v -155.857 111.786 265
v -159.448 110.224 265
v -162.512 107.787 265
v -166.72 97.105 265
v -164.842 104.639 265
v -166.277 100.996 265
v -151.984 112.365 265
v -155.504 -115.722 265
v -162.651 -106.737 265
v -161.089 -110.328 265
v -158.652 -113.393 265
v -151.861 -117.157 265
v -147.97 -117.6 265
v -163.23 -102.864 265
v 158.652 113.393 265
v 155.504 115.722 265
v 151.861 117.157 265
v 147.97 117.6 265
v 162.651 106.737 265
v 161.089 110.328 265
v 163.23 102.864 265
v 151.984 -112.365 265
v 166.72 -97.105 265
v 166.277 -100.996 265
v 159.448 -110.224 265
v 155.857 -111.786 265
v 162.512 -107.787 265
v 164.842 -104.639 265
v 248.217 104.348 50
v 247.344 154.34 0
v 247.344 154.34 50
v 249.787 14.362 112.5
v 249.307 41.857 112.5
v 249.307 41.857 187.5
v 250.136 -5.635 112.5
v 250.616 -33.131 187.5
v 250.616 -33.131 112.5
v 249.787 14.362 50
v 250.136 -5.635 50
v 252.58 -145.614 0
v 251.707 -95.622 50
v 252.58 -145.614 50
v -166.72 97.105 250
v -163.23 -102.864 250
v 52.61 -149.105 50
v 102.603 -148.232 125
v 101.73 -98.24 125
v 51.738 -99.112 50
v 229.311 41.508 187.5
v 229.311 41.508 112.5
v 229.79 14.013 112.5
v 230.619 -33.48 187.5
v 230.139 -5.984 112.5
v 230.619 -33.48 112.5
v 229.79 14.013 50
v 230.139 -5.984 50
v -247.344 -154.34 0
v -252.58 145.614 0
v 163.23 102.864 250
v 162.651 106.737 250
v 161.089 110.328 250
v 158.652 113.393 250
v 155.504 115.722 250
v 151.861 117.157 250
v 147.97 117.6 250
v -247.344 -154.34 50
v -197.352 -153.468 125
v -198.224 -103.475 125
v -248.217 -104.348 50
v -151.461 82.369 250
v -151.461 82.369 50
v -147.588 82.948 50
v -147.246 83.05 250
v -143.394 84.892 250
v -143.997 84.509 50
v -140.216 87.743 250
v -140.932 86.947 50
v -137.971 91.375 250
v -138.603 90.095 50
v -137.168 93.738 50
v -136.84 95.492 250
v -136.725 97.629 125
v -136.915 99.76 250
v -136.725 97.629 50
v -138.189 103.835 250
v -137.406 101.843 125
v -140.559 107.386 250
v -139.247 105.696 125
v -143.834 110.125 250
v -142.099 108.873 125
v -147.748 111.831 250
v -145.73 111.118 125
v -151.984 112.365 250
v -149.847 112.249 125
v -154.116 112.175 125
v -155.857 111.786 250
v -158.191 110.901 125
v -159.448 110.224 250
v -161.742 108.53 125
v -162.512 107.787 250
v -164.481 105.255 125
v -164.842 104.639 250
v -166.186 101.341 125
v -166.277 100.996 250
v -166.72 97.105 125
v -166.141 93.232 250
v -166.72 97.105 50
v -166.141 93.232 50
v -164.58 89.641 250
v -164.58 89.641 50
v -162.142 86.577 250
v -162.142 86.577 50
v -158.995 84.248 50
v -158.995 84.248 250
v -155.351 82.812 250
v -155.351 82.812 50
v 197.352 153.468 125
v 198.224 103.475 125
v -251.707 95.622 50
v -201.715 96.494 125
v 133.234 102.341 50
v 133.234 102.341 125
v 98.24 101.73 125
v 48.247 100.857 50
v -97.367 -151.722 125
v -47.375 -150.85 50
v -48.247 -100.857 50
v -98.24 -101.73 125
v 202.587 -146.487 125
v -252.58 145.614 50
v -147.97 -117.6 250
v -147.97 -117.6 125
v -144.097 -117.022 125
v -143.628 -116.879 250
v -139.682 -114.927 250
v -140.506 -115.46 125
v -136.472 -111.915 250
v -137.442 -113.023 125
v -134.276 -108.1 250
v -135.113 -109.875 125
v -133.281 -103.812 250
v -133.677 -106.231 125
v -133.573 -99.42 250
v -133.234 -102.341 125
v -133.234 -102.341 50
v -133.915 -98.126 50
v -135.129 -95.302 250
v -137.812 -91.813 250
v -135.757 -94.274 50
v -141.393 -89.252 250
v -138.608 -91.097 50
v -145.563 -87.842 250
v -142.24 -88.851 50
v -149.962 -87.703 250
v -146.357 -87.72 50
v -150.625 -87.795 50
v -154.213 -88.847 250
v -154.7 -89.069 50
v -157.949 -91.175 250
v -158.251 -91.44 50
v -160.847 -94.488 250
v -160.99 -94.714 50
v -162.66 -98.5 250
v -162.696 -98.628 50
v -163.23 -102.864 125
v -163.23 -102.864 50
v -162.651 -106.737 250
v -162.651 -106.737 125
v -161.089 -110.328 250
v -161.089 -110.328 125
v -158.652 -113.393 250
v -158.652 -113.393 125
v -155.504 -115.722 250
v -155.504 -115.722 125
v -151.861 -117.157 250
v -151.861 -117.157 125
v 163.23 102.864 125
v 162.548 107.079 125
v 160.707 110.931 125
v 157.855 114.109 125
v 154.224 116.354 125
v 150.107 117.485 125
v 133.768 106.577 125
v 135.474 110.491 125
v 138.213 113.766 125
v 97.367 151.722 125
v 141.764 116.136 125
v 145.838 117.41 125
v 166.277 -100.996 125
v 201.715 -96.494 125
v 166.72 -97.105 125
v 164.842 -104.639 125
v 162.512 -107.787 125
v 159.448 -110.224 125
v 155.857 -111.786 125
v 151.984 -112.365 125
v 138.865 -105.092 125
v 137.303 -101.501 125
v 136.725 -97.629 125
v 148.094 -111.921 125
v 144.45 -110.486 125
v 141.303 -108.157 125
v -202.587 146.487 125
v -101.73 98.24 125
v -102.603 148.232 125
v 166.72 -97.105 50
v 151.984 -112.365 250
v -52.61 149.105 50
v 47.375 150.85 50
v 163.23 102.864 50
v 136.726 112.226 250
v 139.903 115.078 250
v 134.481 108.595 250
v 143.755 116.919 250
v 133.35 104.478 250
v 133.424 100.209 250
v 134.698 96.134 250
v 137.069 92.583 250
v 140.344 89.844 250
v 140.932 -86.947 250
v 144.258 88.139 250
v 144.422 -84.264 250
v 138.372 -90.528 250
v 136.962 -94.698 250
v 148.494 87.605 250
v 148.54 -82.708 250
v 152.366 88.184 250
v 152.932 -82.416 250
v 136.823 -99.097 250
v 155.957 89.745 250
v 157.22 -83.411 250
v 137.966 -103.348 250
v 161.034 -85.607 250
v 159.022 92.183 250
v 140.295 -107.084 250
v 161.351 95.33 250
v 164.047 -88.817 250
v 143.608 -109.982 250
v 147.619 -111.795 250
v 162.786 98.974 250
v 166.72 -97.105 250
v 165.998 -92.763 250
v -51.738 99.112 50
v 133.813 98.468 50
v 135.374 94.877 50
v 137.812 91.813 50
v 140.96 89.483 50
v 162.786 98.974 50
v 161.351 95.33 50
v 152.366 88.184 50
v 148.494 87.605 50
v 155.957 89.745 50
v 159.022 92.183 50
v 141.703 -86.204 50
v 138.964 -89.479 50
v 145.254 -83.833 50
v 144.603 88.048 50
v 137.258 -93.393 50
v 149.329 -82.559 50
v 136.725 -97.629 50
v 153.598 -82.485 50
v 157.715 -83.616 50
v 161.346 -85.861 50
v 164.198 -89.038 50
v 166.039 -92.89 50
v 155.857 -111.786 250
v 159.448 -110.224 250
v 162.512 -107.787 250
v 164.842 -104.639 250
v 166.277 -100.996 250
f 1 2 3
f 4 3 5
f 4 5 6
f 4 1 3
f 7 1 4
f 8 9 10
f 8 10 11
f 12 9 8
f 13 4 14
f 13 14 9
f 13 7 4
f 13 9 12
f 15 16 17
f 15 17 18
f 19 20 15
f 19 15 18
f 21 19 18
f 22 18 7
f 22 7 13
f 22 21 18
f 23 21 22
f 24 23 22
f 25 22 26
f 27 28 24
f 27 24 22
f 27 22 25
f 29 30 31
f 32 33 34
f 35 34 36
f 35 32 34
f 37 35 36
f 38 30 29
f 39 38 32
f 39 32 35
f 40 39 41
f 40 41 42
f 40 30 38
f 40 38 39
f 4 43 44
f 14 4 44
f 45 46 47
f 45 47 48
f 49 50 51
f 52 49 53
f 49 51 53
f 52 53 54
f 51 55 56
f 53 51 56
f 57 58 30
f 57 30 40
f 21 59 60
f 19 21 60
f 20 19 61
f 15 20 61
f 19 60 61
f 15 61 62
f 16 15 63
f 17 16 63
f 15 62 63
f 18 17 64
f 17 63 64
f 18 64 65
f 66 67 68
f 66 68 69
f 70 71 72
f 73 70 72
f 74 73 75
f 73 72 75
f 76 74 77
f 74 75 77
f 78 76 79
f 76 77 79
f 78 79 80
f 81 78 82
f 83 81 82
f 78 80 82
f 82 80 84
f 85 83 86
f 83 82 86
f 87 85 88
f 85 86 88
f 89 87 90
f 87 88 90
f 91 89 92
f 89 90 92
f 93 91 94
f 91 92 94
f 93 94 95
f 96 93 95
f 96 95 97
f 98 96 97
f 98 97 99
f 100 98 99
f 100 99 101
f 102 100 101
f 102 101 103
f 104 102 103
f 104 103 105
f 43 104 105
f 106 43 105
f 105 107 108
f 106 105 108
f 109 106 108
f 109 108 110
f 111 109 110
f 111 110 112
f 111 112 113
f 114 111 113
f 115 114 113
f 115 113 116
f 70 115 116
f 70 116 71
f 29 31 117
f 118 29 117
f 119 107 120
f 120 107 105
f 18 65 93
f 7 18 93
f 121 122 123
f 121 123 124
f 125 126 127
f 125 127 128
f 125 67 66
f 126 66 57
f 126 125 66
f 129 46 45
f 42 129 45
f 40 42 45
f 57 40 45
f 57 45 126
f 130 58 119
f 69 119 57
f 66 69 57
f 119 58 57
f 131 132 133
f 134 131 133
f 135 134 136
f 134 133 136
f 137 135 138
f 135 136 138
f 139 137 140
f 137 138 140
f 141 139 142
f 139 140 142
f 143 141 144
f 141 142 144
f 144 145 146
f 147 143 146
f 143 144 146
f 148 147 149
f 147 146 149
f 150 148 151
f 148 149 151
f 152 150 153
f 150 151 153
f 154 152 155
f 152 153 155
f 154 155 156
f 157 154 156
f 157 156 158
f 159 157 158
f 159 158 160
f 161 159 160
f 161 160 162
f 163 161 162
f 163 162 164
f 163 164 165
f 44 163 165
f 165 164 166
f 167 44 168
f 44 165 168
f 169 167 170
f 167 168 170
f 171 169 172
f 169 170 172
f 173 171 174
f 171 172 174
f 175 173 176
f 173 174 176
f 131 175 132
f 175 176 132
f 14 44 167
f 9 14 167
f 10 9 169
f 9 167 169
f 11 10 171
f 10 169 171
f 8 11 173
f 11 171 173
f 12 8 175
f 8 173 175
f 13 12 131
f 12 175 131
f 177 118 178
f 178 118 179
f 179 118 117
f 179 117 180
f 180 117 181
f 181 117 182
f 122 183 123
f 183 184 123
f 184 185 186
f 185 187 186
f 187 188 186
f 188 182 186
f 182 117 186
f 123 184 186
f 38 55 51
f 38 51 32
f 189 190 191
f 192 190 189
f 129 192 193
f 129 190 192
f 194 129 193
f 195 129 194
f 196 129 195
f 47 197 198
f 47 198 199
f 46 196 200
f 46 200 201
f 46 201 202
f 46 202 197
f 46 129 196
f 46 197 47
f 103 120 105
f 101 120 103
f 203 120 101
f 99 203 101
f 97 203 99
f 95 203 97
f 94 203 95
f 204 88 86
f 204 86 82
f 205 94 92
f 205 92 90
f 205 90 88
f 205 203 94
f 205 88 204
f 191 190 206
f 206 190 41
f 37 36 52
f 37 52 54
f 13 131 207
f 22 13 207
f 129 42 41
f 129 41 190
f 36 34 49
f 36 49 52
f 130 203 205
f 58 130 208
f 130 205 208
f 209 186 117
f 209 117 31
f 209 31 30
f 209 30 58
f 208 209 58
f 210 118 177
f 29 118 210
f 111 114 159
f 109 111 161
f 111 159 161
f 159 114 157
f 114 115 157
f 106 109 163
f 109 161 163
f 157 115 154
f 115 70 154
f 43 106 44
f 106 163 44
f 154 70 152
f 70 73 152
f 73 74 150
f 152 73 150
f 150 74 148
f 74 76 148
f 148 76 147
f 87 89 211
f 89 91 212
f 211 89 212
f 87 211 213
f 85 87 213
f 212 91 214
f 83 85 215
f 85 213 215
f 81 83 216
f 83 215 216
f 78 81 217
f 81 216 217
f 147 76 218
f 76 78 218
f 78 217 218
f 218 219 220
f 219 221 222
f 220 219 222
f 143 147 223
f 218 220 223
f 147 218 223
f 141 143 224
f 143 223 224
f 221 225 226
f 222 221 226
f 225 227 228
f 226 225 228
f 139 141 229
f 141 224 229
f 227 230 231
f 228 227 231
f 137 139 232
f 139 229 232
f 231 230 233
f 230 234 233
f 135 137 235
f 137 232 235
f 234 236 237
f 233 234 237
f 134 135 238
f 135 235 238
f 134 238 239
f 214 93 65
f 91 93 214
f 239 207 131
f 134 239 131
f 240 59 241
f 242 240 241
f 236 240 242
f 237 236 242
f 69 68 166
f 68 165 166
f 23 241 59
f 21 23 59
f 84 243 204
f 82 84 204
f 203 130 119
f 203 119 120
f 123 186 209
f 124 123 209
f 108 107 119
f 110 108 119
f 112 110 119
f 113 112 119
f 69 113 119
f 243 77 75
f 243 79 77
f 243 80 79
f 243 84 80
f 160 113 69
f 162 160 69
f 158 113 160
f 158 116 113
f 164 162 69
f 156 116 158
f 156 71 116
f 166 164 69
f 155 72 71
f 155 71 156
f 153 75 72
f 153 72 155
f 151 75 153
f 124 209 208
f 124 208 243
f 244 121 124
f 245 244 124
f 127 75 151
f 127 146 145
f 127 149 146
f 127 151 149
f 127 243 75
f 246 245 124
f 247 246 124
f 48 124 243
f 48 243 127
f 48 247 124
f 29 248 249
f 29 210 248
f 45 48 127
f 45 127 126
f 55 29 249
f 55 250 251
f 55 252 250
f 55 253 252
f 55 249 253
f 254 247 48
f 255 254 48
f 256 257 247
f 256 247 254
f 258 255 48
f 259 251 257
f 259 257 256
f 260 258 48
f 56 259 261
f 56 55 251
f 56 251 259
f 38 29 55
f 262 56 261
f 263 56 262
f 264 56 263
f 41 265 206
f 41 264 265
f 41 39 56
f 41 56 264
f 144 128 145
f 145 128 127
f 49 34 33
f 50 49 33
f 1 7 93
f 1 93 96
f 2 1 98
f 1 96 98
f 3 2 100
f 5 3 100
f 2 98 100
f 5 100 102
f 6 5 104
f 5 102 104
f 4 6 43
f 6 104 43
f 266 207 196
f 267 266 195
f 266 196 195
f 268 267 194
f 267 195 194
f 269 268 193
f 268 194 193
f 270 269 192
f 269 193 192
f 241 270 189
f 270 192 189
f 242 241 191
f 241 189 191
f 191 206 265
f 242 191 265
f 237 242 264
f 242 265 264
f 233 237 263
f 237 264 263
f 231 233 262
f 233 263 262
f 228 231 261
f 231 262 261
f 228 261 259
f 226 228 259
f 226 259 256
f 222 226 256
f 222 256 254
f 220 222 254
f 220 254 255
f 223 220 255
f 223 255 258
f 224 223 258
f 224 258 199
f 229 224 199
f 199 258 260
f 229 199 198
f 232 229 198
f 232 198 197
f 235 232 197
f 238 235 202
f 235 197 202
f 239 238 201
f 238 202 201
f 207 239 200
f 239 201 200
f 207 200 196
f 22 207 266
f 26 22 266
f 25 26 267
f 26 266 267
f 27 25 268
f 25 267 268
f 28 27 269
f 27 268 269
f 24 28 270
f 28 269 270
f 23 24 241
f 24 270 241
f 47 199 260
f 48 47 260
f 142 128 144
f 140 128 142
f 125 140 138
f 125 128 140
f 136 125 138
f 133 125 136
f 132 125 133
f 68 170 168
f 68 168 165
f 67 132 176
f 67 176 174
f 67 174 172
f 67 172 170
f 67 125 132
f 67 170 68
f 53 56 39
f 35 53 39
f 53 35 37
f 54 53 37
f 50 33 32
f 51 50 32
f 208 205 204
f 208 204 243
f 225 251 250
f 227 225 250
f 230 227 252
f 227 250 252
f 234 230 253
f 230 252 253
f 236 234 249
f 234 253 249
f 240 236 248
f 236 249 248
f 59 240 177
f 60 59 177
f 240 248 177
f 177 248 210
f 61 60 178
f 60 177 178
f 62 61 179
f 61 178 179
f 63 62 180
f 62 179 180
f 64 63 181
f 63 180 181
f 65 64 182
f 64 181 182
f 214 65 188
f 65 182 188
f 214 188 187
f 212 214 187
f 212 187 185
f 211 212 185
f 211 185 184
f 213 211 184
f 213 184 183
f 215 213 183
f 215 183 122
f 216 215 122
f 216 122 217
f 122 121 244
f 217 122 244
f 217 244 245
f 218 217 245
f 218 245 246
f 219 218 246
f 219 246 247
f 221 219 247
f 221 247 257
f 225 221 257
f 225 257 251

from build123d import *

# Parameters (mm, degrees)
SKETCH3_W             = 300
SKETCH3_H             = 500
BOSS_EXTRUDE2_DEPTH   = 50
BOSS_EXTRUDE3_DEPTH   = 50
BOSS_EXTRUDE4_DEPTH   = 50
SKETCH7_R             = 15
BOSS_EXTRUDE5_DEPTH   = 200
BOSS_EXTRUDE6_DEPTH   = 15
SKETCH9_W             = 20
SKETCH9_H             = 20
BOSS_EXTRUDE7_DEPTH   = 100
SKETCH10_W            = 75
SKETCH10_H            = 75
BOSS_EXTRUDE8_DEPTH   = 20
BODY_MOVE_COPY1_ANGLE = 89


with BuildPart() as part:
    # Sketch3 → Boss-Extrude2 (new body)
    with BuildSketch(Plane.XY):
        Rectangle(SKETCH3_W, SKETCH3_H)
    extrude(amount=BOSS_EXTRUDE2_DEPTH)

    # Sketch5 → Boss-Extrude3 (add)
    with BuildSketch(Plane.ZY.offset(150)):
        Polygon((50, 250), (125, 200), (125, 100), (50, 50), align=None)
        Polygon((50, -50), (50, -250), (125, -200), (125, -100), align=None)
    extrude(amount=-BOSS_EXTRUDE3_DEPTH)

    # Sketch6 → Boss-Extrude4 (add)
    with BuildSketch(Plane(origin=(150, 0, 0), x_dir=(0, 0, -1), z_dir=(1, 0, 0))):
        Polygon((-50, -250), (-50, -50), (-125, -100), (-125, -200), align=None)
        Polygon((-50, 250), (-125, 200), (-125, 100), (-50, 50), align=None)
    extrude(amount=-BOSS_EXTRUDE4_DEPTH)

    # Sketch7 → Boss-Extrude5 (add)
    with BuildSketch(Plane.XY.offset(50)):
        with Locations((-100, 150)):
            Circle(SKETCH7_R)
        with Locations((100, 150)):
            Circle(SKETCH7_R)
        with Locations((-100, -150)):
            Circle(SKETCH7_R)
        with Locations((100, -150)):
            Circle(SKETCH7_R)
    extrude(amount=BOSS_EXTRUDE5_DEPTH)

    # Sketch8 → Boss-Extrude6 (add)
    with BuildSketch(Plane.XY.offset(250)):
        with BuildLine():
            Line((-115, 150.000000362), (-115, -150))
            ThreePointArc((-115, -150), (-110.606601718, -160.606601718), (-100, -165))
            Line((-100, -165), (100.000000138, -165))
            ThreePointArc((100.000000138, -165), (110.606601767, -160.606601669), (115, -150))
            Line((115, -150), (115, 150))
            ThreePointArc((115, 150), (110.606601718, 160.606601718), (100, 165))
            Line((100, 165), (-100, 165))
            ThreePointArc((-100, 165), (-110.60660159, 160.606601846), (-115, 150.000000362))
        make_face()
    extrude(amount=BOSS_EXTRUDE6_DEPTH)

    # Sketch9 → Boss-Extrude7 (add)
    with BuildSketch(Plane.XY.offset(50)):
        with Locations((0, 240)):
            Rectangle(SKETCH9_W, SKETCH9_H)
    extrude(amount=BOSS_EXTRUDE7_DEPTH)

    # Sketch10 → Boss-Extrude8 (add)
    with BuildSketch(Plane(origin=(0, 250, 0), x_dir=(1, 0, 0), z_dir=(0, 1, 0))):
        with Locations((0, -150)):
            Rectangle(SKETCH10_W, SKETCH10_H)
    extrude(amount=-BOSS_EXTRUDE8_DEPTH)


with BuildPart() as part_1:
    # Body-Move/Copy1: moved
    add(part.part.rotate(Axis((0, 0, 0), (0, 0, -1)), BODY_MOVE_COPY1_ANGLE))


solid = part_1.part
